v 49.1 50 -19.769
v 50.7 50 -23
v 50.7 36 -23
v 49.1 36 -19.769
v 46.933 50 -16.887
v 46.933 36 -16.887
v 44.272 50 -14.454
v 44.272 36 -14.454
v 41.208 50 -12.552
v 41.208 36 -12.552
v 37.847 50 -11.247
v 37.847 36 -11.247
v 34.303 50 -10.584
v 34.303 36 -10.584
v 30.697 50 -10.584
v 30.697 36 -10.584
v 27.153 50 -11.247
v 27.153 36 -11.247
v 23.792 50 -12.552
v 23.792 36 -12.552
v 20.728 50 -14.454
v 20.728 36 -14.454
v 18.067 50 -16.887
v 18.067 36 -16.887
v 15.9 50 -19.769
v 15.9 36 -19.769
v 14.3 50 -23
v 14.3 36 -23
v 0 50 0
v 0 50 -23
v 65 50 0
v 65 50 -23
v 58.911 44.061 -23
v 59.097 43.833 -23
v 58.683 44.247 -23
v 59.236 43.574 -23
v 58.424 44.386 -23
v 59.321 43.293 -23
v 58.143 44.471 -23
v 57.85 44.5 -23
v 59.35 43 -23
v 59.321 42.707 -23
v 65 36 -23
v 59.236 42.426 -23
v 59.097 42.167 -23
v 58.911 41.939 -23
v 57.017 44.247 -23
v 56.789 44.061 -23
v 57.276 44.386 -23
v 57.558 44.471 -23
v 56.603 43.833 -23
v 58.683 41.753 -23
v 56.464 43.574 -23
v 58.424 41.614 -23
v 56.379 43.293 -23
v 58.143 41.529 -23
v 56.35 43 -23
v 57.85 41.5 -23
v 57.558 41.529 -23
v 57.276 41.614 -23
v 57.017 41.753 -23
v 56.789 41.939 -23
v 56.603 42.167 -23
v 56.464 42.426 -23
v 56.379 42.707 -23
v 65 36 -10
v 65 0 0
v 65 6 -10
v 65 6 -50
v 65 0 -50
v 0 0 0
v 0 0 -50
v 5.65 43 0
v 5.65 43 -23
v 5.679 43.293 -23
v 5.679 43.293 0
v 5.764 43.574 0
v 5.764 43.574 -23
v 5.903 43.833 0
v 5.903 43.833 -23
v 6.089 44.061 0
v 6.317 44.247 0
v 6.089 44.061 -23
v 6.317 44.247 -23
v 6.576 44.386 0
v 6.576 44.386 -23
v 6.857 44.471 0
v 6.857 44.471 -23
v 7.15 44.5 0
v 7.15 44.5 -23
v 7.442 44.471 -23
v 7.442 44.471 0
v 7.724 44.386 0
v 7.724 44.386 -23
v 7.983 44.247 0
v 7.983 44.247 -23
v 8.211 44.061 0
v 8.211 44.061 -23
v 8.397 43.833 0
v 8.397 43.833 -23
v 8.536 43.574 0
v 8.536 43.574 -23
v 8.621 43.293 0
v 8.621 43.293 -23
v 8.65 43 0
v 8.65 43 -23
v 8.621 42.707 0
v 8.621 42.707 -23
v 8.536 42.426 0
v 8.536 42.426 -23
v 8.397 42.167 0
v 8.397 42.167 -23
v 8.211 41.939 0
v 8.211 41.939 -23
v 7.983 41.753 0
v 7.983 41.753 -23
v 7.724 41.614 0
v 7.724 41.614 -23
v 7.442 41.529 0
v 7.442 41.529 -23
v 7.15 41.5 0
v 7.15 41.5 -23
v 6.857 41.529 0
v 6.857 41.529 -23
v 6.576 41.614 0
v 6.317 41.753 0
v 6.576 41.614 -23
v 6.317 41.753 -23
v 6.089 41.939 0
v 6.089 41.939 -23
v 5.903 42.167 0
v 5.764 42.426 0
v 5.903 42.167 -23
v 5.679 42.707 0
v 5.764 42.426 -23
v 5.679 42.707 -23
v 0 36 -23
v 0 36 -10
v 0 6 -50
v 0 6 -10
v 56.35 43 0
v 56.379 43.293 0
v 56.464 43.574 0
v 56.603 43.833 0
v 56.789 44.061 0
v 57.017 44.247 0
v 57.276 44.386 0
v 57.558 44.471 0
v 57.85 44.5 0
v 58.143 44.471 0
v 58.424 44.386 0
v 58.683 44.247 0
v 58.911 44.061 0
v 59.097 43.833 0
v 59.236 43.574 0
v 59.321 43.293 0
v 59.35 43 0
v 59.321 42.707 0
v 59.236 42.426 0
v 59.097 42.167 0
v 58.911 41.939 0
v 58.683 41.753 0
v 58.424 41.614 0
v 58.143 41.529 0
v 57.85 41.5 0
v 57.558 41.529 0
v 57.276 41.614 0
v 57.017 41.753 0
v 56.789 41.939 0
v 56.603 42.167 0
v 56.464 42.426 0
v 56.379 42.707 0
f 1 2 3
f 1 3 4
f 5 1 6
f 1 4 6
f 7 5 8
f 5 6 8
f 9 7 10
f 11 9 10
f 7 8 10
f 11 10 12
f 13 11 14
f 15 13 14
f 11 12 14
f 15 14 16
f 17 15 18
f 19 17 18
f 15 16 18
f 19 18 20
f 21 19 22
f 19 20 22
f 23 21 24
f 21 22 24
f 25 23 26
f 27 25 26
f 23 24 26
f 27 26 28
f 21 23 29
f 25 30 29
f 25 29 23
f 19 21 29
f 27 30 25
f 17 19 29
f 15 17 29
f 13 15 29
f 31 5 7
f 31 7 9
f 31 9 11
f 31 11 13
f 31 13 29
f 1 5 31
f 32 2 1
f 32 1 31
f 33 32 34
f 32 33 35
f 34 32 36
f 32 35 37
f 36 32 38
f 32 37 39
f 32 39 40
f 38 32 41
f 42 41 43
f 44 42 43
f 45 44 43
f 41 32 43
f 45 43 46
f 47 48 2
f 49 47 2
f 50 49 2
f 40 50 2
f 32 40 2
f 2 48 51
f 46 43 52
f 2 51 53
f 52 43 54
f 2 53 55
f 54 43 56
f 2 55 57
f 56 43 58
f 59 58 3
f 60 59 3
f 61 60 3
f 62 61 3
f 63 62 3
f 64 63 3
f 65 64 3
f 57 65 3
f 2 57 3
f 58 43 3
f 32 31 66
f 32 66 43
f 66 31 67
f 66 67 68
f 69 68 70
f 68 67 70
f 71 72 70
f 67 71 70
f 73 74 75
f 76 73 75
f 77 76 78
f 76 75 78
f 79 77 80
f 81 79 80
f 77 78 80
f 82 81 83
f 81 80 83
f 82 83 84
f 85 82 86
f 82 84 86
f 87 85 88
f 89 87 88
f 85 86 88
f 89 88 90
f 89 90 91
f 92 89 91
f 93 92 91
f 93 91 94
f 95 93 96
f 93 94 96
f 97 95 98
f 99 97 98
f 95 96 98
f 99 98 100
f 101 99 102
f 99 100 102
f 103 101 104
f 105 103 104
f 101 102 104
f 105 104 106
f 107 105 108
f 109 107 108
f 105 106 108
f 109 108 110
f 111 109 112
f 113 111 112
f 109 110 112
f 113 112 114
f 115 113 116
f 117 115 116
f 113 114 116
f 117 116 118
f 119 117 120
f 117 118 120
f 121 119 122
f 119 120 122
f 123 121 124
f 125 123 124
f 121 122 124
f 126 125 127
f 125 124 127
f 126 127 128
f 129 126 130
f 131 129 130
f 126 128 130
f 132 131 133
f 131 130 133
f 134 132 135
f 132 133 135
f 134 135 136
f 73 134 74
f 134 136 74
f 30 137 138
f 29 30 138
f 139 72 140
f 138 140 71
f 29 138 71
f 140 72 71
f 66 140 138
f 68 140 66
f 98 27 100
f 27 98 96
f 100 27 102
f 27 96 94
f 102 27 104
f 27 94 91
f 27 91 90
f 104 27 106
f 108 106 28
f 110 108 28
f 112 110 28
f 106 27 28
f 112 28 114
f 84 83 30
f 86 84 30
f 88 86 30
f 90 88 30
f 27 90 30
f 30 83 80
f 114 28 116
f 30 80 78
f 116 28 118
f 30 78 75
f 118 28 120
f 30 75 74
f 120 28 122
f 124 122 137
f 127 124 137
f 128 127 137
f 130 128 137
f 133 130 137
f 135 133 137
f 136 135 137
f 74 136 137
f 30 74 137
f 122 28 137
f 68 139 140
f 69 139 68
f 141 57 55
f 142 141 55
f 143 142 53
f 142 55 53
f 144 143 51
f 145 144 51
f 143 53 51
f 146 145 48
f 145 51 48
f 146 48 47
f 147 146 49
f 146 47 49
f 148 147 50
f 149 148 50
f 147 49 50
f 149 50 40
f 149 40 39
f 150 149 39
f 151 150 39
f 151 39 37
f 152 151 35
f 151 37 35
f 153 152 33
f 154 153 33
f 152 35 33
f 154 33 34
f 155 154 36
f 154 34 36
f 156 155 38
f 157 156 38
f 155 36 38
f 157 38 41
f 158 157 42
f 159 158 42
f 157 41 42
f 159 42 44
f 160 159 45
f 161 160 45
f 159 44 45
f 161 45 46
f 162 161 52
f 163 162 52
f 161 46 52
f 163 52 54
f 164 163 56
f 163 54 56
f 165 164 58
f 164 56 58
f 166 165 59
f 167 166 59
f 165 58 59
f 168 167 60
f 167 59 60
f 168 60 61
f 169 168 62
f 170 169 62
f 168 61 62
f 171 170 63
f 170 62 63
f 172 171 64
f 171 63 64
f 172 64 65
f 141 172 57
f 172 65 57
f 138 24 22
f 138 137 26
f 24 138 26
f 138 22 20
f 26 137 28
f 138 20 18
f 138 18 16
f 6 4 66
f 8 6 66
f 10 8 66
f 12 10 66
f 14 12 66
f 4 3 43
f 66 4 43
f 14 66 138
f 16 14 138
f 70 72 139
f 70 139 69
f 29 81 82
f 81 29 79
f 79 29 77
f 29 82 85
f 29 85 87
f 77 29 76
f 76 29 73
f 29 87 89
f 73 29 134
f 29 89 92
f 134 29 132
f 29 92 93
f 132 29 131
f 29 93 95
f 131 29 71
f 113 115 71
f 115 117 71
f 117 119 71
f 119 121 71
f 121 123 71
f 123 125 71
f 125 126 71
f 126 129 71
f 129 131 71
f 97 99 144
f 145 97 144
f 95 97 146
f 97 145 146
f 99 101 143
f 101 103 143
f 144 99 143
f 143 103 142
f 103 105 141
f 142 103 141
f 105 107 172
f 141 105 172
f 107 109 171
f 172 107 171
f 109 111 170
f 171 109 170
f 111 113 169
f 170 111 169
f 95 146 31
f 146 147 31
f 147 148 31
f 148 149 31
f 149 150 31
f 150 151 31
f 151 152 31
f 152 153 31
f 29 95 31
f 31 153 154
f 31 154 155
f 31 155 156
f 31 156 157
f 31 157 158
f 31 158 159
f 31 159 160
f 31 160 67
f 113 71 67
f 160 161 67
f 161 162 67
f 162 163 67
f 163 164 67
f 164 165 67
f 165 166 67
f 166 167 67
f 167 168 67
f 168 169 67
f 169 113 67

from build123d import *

# Parameters (mm, degrees)
SKETCH1_W           = 65
SKETCH1_H           = 50
BOSS_EXTRUDE1_DEPTH = 6
SKETCH2_W           = 65
SKETCH2_H           = 10
BOSS_EXTRUDE2_DEPTH = 30
BOSS_EXTRUDE3_DEPTH = 14
SKETCH4_R           = 1.5
CUT_EXTRUDE1_DEPTH  = 23


with BuildPart() as part:
    # Sketch1 → Boss-Extrude1 (new body)
    with BuildSketch(Plane(origin=(0, 0, 0), x_dir=(1, 0, 0), z_dir=(0, 1, 0))):
        with Locations((32.5, 25)):
            Rectangle(SKETCH1_W, SKETCH1_H)
    extrude(amount=BOSS_EXTRUDE1_DEPTH)

    # Sketch2 → Boss-Extrude2 (add)
    with BuildSketch(Plane(origin=(0, 6, 0), x_dir=(1, 0, 0), z_dir=(0, 1, 0))):
        with Locations((32.5, 5)):
            Rectangle(SKETCH2_W, SKETCH2_H)
    extrude(amount=BOSS_EXTRUDE2_DEPTH)

    # Sketch3 → Boss-Extrude3 (add)
    with BuildSketch(Plane(origin=(0, 36, 0), x_dir=(1, 0, 0), z_dir=(0, 1, 0))):
        with BuildLine():
            Line((0, 0), (65, 0))
            Line((65, 0), (65, 23))
            Line((65, 23), (50.700274723, 23))
            ThreePointArc((50.700274723, 23), (32.5, 10.5), (14.299725277, 23))
            Line((14.299725277, 23), (0, 23))
            Line((0, 23), (0, 0))
        make_face()
    extrude(amount=BOSS_EXTRUDE3_DEPTH)

    # Sketch4 → Cut-Extrude1 (cut)
    with BuildSketch(Plane(origin=(0, 0, -23), x_dir=(-1, 0, 0), z_dir=(0, 0, -1))):
        with Locations((-57.850137362, 43)):
            Circle(SKETCH4_R)
        with Locations((-7.149862638, 43)):
            Circle(SKETCH4_R)
    extrude(amount=-CUT_EXTRUDE1_DEPTH, mode=Mode.SUBTRACT)


solid = part.part
